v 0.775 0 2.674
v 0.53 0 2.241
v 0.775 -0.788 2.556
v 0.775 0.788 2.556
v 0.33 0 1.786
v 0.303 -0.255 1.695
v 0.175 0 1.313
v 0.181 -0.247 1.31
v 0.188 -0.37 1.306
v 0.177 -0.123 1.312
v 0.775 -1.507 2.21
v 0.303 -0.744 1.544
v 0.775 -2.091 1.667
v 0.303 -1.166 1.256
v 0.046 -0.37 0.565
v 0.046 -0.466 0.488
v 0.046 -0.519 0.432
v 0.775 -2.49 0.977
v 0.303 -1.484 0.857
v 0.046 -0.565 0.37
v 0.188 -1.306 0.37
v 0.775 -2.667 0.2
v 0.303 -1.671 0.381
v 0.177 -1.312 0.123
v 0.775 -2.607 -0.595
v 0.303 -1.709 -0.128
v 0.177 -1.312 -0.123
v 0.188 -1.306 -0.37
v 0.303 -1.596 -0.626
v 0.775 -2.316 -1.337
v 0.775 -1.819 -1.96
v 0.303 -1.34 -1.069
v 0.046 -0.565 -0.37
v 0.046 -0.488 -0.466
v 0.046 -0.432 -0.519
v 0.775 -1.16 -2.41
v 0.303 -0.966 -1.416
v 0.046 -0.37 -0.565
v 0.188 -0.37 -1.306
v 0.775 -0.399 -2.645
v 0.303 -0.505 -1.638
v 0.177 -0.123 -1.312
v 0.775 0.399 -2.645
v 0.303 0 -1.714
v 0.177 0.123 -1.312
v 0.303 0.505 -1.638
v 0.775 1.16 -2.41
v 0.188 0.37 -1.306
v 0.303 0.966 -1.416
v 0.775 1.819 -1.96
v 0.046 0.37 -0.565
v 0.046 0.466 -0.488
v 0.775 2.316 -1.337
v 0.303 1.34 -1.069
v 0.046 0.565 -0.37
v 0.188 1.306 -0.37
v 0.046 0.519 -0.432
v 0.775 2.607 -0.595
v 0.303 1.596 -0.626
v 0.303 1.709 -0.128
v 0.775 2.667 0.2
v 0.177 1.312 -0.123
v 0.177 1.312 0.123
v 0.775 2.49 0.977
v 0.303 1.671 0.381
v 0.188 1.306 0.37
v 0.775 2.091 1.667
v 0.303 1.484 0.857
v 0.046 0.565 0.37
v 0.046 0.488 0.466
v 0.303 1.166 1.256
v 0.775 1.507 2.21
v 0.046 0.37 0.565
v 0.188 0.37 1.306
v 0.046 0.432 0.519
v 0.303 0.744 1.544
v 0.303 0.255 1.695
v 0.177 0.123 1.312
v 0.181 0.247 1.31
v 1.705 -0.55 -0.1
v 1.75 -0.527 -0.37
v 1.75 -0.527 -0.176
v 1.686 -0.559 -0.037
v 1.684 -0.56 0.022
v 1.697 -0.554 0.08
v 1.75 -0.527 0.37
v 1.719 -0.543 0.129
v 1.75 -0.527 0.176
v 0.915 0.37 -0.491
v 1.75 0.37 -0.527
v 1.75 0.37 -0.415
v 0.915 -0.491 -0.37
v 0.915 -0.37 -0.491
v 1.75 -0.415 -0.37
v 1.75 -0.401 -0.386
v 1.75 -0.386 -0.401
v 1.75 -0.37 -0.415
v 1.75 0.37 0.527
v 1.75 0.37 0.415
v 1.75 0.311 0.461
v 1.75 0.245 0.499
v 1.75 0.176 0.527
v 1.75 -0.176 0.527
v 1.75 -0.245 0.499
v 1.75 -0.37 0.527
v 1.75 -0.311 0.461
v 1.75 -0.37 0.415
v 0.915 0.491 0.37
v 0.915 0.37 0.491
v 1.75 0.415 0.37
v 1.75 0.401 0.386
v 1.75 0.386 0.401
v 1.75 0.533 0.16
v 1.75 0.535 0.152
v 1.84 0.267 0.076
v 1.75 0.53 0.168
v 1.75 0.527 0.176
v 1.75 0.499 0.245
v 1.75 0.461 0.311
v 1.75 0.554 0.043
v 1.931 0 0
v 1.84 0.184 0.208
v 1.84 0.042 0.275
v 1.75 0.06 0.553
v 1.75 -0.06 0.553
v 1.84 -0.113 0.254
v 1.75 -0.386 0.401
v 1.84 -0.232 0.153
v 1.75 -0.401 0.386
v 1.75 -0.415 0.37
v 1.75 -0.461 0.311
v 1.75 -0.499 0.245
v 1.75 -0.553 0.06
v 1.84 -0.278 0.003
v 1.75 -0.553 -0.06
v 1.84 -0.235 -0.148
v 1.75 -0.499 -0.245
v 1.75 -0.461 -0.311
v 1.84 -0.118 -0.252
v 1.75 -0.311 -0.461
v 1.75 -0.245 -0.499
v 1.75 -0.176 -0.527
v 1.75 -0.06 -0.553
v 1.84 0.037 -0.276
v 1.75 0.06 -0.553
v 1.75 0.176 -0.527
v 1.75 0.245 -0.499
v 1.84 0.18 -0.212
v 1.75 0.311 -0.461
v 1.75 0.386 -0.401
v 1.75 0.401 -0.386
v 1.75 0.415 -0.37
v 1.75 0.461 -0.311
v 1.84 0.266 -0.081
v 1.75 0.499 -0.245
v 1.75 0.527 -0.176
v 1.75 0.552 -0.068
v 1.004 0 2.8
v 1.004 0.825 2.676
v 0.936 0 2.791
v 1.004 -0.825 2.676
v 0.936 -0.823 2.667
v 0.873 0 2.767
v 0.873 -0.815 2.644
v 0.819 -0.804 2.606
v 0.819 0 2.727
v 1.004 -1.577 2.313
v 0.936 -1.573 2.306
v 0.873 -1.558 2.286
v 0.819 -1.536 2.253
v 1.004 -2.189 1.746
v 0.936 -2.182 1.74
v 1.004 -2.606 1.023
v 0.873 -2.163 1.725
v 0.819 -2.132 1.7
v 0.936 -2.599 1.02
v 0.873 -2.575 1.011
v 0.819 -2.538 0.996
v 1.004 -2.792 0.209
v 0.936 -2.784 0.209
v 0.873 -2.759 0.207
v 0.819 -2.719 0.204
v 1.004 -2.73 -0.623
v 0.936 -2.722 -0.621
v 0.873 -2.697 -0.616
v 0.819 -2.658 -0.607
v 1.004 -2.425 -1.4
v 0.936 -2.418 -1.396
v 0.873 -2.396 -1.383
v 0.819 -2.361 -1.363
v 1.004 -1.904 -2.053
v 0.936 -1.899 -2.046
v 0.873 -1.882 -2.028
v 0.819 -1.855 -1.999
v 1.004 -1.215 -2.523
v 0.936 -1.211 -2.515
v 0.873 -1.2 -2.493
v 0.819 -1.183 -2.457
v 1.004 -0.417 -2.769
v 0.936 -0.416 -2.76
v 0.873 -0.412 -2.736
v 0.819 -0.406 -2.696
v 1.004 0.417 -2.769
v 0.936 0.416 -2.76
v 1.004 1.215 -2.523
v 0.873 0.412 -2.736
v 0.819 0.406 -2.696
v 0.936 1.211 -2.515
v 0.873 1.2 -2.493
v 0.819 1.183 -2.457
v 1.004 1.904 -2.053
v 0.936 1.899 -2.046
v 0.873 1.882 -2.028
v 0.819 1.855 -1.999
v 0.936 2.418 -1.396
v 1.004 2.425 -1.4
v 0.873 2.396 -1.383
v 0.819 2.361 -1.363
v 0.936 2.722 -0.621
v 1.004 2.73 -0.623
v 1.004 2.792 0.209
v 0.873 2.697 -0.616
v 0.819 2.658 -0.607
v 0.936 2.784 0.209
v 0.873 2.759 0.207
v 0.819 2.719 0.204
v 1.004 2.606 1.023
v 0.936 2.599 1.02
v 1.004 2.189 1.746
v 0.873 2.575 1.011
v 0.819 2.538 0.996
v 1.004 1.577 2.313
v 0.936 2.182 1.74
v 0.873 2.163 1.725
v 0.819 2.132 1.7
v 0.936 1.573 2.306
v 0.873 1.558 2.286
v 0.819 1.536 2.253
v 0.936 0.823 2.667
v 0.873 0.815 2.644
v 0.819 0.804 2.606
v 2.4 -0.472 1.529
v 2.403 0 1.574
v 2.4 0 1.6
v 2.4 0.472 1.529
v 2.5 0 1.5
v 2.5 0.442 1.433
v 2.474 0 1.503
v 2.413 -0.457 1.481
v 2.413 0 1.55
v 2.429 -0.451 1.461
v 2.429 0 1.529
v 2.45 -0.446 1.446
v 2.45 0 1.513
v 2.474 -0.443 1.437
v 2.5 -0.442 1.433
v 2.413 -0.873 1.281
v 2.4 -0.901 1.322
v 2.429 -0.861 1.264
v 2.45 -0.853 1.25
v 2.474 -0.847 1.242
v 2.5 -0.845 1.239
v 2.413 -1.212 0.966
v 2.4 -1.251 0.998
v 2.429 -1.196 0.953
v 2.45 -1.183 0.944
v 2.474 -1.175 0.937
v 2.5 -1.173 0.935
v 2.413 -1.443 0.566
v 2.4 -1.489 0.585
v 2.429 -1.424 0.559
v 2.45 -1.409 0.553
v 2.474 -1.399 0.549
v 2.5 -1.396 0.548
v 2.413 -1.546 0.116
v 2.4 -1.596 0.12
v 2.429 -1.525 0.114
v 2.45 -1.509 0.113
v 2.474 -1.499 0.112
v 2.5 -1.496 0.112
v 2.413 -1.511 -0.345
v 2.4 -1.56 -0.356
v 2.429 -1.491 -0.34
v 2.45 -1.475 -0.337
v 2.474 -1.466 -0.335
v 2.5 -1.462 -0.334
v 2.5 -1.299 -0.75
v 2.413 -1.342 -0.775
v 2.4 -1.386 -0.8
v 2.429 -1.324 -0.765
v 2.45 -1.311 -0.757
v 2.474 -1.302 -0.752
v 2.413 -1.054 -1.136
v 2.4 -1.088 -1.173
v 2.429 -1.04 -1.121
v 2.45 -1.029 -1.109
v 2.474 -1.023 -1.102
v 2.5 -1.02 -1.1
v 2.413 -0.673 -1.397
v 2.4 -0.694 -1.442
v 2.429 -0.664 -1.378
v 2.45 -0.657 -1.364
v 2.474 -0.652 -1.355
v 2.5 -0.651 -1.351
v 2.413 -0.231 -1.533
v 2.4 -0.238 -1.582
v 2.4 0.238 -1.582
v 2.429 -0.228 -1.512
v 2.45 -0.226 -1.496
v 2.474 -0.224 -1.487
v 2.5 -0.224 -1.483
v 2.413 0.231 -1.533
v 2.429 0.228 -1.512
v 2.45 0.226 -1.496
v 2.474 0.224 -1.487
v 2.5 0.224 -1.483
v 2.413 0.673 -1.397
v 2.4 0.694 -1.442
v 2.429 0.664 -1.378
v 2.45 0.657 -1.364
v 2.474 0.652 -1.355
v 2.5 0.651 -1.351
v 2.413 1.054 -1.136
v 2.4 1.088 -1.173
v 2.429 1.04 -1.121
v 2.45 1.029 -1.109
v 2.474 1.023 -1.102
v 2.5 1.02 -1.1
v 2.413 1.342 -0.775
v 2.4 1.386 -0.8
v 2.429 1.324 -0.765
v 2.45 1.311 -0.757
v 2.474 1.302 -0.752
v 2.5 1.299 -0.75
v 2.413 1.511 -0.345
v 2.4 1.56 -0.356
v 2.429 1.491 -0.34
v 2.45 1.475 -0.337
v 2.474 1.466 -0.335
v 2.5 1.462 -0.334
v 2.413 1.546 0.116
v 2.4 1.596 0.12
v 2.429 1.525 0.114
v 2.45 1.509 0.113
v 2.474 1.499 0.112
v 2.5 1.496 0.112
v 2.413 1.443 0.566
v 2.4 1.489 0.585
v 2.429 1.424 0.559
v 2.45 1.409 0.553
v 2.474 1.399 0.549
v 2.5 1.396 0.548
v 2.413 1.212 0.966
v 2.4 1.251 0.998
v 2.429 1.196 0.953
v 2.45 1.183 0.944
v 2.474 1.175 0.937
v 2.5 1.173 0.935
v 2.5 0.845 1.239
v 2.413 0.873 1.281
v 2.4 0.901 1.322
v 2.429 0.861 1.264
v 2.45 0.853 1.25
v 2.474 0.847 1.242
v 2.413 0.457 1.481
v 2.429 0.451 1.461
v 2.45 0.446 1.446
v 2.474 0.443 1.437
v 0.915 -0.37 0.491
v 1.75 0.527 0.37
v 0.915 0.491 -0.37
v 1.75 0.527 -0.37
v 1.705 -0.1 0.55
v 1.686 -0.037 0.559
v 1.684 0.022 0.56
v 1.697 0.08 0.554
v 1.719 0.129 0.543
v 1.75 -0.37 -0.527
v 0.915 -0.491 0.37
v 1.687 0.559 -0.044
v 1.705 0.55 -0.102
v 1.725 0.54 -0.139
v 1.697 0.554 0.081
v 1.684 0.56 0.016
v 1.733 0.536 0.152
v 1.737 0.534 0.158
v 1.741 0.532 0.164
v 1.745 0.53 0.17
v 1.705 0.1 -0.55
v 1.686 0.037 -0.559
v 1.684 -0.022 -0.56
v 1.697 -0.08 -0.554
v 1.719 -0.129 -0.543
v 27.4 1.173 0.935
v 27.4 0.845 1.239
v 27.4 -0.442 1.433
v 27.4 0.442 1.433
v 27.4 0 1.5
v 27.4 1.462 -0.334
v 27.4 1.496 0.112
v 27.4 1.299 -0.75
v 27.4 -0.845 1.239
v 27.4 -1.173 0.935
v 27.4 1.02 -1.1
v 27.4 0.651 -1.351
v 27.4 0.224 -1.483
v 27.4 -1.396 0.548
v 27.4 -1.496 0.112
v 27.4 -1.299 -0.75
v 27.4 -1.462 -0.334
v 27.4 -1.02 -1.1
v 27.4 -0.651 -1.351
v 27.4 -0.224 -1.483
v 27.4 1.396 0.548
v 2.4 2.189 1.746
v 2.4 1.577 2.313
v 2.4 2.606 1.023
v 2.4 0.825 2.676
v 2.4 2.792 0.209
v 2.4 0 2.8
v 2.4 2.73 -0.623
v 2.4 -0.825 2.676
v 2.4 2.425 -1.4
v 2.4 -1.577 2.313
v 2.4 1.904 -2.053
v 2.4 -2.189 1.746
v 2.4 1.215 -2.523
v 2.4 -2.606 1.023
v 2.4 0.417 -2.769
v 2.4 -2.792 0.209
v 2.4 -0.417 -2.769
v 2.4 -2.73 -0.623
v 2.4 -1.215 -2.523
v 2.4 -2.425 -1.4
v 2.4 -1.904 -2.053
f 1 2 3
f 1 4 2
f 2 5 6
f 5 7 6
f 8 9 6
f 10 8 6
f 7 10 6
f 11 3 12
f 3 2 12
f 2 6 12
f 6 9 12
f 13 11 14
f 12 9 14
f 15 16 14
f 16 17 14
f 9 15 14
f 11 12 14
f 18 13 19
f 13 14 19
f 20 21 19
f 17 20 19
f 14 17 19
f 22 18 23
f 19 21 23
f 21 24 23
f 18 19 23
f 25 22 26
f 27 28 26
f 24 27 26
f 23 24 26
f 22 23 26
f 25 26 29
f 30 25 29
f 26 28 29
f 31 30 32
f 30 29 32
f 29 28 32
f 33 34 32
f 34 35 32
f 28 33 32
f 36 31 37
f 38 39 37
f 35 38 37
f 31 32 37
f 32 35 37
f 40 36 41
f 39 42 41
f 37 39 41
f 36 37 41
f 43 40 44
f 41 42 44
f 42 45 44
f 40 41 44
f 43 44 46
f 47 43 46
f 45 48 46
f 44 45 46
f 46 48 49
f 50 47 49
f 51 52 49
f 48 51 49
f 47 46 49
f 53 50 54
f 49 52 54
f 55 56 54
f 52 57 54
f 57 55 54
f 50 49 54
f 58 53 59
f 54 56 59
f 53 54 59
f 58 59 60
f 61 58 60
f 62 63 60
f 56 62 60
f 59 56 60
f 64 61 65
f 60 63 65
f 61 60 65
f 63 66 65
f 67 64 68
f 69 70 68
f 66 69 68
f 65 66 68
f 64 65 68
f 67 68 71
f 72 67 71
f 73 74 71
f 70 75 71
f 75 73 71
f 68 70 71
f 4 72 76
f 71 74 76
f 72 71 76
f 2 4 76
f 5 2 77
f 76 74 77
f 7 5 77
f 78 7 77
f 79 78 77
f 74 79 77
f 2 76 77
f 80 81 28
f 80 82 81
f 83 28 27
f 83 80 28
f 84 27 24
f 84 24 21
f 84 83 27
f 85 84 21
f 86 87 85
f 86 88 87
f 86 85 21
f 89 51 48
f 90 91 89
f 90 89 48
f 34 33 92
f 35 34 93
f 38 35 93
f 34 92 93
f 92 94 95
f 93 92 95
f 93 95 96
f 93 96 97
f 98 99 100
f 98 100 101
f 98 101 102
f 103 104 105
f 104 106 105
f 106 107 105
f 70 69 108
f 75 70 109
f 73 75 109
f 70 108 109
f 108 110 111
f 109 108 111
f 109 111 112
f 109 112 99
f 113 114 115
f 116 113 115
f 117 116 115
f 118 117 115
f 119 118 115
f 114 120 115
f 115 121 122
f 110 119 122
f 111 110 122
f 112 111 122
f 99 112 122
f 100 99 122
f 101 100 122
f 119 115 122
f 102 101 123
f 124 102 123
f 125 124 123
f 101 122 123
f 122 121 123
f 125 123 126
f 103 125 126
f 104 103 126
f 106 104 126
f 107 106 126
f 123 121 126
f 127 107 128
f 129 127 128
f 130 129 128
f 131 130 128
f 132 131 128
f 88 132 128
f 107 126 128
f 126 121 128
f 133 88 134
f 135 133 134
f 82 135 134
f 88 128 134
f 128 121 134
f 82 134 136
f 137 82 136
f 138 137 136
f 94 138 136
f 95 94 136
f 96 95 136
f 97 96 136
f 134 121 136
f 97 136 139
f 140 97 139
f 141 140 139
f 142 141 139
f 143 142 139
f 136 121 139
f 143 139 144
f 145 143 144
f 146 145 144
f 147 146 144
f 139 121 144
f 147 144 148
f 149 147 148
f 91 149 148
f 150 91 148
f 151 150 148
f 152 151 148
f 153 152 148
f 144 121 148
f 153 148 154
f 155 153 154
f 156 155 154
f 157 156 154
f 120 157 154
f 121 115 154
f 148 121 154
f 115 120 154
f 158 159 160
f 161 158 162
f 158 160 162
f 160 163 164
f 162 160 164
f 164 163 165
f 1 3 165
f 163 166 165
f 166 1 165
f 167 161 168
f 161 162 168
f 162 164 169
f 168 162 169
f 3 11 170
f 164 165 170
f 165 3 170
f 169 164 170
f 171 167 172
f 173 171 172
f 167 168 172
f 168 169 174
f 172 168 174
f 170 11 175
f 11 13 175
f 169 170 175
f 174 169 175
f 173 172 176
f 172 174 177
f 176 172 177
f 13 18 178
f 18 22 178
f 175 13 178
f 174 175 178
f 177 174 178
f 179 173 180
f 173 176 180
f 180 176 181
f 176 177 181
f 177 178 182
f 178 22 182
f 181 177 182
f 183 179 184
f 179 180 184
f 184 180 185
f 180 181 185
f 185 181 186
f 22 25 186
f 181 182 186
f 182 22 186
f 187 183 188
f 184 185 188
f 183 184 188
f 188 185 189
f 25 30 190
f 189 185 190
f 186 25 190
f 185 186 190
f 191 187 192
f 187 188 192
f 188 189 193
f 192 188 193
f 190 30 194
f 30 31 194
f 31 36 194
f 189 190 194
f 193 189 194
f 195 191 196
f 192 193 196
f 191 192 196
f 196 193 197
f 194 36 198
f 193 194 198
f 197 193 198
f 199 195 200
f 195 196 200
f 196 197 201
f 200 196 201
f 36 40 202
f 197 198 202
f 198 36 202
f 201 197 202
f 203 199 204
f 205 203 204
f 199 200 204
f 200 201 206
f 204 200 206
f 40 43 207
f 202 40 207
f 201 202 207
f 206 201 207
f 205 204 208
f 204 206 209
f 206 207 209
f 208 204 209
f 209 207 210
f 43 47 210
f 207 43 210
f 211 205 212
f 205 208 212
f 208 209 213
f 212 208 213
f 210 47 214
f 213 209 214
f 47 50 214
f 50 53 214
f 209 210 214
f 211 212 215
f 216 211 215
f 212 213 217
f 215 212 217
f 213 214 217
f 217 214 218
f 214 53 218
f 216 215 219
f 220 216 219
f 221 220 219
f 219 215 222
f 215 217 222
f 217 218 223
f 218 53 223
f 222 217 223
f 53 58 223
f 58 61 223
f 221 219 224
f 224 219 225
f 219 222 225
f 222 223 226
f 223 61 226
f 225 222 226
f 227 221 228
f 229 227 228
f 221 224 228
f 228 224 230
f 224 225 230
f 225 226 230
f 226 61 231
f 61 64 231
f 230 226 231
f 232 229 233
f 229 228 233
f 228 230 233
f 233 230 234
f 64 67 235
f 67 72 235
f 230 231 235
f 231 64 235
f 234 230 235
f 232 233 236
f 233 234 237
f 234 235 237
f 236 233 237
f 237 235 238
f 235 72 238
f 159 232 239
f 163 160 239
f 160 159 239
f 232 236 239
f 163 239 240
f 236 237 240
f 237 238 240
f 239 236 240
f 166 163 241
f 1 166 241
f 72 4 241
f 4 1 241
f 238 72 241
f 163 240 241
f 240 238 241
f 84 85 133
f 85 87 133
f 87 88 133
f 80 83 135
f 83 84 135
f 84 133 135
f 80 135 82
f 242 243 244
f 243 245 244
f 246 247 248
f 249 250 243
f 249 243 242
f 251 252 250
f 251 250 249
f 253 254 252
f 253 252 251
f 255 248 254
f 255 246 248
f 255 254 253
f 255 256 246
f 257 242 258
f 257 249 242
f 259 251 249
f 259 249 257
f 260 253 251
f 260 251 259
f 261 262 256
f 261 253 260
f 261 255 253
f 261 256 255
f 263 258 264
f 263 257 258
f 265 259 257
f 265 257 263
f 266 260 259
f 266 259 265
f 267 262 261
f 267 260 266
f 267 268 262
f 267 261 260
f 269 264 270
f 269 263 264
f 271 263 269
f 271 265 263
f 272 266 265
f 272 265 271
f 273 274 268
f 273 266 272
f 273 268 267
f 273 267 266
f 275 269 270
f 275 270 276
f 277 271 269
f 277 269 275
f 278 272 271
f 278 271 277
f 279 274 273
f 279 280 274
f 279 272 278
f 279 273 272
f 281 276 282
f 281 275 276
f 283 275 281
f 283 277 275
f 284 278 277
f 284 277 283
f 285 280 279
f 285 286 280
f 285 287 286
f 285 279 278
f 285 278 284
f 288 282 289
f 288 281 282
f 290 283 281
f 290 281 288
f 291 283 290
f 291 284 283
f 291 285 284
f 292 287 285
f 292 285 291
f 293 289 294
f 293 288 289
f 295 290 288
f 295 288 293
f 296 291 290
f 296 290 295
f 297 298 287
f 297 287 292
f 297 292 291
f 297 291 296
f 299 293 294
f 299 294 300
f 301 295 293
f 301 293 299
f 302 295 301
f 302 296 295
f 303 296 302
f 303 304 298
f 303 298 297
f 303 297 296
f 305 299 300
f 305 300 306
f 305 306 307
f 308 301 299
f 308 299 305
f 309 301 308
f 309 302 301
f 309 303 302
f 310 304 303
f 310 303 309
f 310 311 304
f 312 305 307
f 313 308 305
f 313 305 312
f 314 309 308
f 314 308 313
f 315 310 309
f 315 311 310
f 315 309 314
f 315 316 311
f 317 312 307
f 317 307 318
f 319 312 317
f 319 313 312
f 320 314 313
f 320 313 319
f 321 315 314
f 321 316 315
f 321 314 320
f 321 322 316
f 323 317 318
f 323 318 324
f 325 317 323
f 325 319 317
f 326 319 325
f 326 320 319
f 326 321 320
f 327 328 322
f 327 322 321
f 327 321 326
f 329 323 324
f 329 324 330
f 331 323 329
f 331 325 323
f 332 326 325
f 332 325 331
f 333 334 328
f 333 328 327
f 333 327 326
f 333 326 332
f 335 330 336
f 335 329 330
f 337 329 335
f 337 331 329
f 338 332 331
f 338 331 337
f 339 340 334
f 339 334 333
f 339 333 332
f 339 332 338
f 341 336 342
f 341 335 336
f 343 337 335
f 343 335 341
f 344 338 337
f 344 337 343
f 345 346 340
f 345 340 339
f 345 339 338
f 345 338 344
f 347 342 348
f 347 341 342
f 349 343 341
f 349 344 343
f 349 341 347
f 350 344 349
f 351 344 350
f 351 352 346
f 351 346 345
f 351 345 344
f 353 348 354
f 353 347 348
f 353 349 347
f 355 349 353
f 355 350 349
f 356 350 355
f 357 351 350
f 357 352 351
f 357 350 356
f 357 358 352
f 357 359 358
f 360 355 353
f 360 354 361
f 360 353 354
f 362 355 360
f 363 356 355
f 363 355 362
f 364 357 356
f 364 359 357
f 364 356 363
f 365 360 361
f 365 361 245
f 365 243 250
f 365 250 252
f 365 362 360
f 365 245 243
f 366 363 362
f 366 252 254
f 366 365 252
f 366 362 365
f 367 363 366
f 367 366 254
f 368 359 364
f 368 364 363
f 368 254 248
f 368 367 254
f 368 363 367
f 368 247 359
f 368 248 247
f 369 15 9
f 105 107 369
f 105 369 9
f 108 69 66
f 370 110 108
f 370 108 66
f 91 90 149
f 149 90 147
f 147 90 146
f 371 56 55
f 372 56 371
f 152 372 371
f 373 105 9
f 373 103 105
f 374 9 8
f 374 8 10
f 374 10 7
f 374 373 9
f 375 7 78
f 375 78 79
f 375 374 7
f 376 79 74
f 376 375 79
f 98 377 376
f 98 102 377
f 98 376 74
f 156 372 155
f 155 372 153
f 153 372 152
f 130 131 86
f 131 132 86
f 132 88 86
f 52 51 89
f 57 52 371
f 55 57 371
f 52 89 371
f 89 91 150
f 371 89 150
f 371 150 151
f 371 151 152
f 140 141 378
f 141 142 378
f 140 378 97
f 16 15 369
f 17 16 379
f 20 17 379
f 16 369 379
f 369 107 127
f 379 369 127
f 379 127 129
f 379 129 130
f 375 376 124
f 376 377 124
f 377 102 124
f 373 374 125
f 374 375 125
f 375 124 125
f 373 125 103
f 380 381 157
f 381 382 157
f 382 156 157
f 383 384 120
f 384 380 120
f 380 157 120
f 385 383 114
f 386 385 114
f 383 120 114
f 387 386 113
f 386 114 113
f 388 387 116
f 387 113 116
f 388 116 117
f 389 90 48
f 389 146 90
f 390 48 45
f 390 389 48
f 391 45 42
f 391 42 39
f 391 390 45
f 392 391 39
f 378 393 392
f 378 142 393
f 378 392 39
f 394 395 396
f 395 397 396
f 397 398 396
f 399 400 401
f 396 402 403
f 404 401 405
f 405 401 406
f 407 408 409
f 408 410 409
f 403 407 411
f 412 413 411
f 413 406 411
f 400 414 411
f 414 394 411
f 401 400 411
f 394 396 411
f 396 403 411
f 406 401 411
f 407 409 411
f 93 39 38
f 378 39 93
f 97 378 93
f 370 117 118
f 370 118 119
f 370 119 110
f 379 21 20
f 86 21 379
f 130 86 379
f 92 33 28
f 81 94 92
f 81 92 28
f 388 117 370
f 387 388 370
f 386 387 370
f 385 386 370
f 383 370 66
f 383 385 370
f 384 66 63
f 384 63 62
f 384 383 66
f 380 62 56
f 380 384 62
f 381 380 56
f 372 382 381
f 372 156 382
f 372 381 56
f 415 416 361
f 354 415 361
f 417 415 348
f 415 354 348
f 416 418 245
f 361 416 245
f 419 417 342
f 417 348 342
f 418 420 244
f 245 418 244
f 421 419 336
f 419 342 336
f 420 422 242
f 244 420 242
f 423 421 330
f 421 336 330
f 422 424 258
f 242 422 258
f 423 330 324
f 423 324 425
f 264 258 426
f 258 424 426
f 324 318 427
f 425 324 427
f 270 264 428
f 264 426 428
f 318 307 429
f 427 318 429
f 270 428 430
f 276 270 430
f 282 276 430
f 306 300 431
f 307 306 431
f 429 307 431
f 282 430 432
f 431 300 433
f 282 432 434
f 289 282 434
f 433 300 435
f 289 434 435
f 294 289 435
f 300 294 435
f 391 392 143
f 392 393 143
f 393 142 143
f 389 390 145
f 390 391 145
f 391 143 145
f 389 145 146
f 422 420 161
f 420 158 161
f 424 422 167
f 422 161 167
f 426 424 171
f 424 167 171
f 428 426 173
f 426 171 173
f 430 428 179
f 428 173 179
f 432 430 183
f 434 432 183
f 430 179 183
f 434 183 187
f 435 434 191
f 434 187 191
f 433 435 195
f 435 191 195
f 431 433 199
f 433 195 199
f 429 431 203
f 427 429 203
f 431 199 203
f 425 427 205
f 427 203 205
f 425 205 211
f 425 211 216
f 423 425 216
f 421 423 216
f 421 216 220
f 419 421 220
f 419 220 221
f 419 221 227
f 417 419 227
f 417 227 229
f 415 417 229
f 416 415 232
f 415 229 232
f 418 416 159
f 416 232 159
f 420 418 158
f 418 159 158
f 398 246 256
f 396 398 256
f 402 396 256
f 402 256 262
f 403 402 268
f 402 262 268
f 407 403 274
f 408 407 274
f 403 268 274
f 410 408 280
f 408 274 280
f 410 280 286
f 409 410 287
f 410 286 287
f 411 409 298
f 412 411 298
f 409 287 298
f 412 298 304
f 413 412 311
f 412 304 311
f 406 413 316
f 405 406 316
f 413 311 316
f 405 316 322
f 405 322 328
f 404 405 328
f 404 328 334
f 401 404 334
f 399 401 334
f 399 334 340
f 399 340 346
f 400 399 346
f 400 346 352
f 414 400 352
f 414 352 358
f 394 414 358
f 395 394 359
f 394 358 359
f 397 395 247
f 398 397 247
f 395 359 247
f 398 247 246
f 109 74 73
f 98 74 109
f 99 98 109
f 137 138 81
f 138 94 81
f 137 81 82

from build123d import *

# Parameters (mm, degrees)
FILLET1_R    = 0.1
RECPAT_COUNT = 2
RECPAT_ANGLE = 90


with BuildPart() as part:
    # BodySke → Base-Revolve (revolve)
    with BuildSketch(Plane.XY, mode=Mode.PRIVATE) as base_revolve_sk:
        with BuildLine():
            Line((2.4, 1.5), (2.4, 2.8))
            Line((2.4, 2.8), (1.003501533, 2.8))
            ThreePointArc((1.003501533, 2.8), (0.873295971, 2.76653015), (0.775371599, 2.674418605))
            ThreePointArc((0.775371599, 2.674418605), (0.197753546, 1.392274756), (0, 0))
            Line((0, 0), (27.4, 0))
            Line((27.4, 0), (27.4, 1.5))
            Line((27.4, 1.5), (2.4, 1.5))
        make_face()
    revolve(base_revolve_sk.sketch.rotate(Axis((1.003501533, 0, 0), (1, 0, 0)), 90), axis=Axis((1.003501533, 0, 0), (1, 0, 0)))

    # Fillet1
    fillet1_edges = [part.edges().sort_by_distance(p)[0] for p in [
        (2.4, 0, -1.5),
    ]]
    fillet(fillet1_edges, radius=FILLET1_R)

    # Sketch3 → Recess section 0
    with BuildSketch(Plane(origin=(0, 0, 0), x_dir=(0, 0, -1), z_dir=(1, 0, 0))):
        with BuildLine():
            Line((0.37, -1.4), (-0.37, -1.4))
            Line((-0.37, -1.4), (-0.37, 1.4))
            Line((-0.37, 1.4), (0.37, 1.4))
            Line((0.37, 1.4), (0.37, -1.4))
        make_face()
    # Sketch4 → Recess section 1
    with BuildSketch(Plane(origin=(1.75, 0, 0), x_dir=(0, 0, -1), z_dir=(1, 0, 0))):
        with BuildLine():
            Line((0.37, -0.527482332), (-0.37, -0.527482332))
            Line((-0.37, -0.527482332), (-0.37, 0.527482332))
            Line((-0.37, 0.527482332), (0.37, 0.527482332))
            Line((0.37, 0.527482332), (0.37, -0.527482332))
        make_face()
    recess = loft(mode=Mode.SUBTRACT)

    # RecPat: Recess ×2 about axis
    recpat_axis = Axis((0, 0, 0), (1, 0, 0))
    for i in range(1, RECPAT_COUNT):
        add(recess.rotate(recpat_axis, i * RECPAT_ANGLE / (RECPAT_COUNT - 1)), mode=Mode.SUBTRACT)

    # RecCorSke → RecessCore (revolve, cut)
    with BuildSketch(Plane.XY, mode=Mode.PRIVATE) as recesscore_sk:
        Polygon((0, 0), (0, 0.678371921), (1.75, 0.556), (1.930655351, 0), align=None)
    revolve(recesscore_sk.sketch.rotate(Axis((-3.175, 0, 0), (1, 0, 0)), 15.814025638), axis=Axis((-3.175, 0, 0), (1, 0, 0)), mode=Mode.SUBTRACT)


solid = part.part
